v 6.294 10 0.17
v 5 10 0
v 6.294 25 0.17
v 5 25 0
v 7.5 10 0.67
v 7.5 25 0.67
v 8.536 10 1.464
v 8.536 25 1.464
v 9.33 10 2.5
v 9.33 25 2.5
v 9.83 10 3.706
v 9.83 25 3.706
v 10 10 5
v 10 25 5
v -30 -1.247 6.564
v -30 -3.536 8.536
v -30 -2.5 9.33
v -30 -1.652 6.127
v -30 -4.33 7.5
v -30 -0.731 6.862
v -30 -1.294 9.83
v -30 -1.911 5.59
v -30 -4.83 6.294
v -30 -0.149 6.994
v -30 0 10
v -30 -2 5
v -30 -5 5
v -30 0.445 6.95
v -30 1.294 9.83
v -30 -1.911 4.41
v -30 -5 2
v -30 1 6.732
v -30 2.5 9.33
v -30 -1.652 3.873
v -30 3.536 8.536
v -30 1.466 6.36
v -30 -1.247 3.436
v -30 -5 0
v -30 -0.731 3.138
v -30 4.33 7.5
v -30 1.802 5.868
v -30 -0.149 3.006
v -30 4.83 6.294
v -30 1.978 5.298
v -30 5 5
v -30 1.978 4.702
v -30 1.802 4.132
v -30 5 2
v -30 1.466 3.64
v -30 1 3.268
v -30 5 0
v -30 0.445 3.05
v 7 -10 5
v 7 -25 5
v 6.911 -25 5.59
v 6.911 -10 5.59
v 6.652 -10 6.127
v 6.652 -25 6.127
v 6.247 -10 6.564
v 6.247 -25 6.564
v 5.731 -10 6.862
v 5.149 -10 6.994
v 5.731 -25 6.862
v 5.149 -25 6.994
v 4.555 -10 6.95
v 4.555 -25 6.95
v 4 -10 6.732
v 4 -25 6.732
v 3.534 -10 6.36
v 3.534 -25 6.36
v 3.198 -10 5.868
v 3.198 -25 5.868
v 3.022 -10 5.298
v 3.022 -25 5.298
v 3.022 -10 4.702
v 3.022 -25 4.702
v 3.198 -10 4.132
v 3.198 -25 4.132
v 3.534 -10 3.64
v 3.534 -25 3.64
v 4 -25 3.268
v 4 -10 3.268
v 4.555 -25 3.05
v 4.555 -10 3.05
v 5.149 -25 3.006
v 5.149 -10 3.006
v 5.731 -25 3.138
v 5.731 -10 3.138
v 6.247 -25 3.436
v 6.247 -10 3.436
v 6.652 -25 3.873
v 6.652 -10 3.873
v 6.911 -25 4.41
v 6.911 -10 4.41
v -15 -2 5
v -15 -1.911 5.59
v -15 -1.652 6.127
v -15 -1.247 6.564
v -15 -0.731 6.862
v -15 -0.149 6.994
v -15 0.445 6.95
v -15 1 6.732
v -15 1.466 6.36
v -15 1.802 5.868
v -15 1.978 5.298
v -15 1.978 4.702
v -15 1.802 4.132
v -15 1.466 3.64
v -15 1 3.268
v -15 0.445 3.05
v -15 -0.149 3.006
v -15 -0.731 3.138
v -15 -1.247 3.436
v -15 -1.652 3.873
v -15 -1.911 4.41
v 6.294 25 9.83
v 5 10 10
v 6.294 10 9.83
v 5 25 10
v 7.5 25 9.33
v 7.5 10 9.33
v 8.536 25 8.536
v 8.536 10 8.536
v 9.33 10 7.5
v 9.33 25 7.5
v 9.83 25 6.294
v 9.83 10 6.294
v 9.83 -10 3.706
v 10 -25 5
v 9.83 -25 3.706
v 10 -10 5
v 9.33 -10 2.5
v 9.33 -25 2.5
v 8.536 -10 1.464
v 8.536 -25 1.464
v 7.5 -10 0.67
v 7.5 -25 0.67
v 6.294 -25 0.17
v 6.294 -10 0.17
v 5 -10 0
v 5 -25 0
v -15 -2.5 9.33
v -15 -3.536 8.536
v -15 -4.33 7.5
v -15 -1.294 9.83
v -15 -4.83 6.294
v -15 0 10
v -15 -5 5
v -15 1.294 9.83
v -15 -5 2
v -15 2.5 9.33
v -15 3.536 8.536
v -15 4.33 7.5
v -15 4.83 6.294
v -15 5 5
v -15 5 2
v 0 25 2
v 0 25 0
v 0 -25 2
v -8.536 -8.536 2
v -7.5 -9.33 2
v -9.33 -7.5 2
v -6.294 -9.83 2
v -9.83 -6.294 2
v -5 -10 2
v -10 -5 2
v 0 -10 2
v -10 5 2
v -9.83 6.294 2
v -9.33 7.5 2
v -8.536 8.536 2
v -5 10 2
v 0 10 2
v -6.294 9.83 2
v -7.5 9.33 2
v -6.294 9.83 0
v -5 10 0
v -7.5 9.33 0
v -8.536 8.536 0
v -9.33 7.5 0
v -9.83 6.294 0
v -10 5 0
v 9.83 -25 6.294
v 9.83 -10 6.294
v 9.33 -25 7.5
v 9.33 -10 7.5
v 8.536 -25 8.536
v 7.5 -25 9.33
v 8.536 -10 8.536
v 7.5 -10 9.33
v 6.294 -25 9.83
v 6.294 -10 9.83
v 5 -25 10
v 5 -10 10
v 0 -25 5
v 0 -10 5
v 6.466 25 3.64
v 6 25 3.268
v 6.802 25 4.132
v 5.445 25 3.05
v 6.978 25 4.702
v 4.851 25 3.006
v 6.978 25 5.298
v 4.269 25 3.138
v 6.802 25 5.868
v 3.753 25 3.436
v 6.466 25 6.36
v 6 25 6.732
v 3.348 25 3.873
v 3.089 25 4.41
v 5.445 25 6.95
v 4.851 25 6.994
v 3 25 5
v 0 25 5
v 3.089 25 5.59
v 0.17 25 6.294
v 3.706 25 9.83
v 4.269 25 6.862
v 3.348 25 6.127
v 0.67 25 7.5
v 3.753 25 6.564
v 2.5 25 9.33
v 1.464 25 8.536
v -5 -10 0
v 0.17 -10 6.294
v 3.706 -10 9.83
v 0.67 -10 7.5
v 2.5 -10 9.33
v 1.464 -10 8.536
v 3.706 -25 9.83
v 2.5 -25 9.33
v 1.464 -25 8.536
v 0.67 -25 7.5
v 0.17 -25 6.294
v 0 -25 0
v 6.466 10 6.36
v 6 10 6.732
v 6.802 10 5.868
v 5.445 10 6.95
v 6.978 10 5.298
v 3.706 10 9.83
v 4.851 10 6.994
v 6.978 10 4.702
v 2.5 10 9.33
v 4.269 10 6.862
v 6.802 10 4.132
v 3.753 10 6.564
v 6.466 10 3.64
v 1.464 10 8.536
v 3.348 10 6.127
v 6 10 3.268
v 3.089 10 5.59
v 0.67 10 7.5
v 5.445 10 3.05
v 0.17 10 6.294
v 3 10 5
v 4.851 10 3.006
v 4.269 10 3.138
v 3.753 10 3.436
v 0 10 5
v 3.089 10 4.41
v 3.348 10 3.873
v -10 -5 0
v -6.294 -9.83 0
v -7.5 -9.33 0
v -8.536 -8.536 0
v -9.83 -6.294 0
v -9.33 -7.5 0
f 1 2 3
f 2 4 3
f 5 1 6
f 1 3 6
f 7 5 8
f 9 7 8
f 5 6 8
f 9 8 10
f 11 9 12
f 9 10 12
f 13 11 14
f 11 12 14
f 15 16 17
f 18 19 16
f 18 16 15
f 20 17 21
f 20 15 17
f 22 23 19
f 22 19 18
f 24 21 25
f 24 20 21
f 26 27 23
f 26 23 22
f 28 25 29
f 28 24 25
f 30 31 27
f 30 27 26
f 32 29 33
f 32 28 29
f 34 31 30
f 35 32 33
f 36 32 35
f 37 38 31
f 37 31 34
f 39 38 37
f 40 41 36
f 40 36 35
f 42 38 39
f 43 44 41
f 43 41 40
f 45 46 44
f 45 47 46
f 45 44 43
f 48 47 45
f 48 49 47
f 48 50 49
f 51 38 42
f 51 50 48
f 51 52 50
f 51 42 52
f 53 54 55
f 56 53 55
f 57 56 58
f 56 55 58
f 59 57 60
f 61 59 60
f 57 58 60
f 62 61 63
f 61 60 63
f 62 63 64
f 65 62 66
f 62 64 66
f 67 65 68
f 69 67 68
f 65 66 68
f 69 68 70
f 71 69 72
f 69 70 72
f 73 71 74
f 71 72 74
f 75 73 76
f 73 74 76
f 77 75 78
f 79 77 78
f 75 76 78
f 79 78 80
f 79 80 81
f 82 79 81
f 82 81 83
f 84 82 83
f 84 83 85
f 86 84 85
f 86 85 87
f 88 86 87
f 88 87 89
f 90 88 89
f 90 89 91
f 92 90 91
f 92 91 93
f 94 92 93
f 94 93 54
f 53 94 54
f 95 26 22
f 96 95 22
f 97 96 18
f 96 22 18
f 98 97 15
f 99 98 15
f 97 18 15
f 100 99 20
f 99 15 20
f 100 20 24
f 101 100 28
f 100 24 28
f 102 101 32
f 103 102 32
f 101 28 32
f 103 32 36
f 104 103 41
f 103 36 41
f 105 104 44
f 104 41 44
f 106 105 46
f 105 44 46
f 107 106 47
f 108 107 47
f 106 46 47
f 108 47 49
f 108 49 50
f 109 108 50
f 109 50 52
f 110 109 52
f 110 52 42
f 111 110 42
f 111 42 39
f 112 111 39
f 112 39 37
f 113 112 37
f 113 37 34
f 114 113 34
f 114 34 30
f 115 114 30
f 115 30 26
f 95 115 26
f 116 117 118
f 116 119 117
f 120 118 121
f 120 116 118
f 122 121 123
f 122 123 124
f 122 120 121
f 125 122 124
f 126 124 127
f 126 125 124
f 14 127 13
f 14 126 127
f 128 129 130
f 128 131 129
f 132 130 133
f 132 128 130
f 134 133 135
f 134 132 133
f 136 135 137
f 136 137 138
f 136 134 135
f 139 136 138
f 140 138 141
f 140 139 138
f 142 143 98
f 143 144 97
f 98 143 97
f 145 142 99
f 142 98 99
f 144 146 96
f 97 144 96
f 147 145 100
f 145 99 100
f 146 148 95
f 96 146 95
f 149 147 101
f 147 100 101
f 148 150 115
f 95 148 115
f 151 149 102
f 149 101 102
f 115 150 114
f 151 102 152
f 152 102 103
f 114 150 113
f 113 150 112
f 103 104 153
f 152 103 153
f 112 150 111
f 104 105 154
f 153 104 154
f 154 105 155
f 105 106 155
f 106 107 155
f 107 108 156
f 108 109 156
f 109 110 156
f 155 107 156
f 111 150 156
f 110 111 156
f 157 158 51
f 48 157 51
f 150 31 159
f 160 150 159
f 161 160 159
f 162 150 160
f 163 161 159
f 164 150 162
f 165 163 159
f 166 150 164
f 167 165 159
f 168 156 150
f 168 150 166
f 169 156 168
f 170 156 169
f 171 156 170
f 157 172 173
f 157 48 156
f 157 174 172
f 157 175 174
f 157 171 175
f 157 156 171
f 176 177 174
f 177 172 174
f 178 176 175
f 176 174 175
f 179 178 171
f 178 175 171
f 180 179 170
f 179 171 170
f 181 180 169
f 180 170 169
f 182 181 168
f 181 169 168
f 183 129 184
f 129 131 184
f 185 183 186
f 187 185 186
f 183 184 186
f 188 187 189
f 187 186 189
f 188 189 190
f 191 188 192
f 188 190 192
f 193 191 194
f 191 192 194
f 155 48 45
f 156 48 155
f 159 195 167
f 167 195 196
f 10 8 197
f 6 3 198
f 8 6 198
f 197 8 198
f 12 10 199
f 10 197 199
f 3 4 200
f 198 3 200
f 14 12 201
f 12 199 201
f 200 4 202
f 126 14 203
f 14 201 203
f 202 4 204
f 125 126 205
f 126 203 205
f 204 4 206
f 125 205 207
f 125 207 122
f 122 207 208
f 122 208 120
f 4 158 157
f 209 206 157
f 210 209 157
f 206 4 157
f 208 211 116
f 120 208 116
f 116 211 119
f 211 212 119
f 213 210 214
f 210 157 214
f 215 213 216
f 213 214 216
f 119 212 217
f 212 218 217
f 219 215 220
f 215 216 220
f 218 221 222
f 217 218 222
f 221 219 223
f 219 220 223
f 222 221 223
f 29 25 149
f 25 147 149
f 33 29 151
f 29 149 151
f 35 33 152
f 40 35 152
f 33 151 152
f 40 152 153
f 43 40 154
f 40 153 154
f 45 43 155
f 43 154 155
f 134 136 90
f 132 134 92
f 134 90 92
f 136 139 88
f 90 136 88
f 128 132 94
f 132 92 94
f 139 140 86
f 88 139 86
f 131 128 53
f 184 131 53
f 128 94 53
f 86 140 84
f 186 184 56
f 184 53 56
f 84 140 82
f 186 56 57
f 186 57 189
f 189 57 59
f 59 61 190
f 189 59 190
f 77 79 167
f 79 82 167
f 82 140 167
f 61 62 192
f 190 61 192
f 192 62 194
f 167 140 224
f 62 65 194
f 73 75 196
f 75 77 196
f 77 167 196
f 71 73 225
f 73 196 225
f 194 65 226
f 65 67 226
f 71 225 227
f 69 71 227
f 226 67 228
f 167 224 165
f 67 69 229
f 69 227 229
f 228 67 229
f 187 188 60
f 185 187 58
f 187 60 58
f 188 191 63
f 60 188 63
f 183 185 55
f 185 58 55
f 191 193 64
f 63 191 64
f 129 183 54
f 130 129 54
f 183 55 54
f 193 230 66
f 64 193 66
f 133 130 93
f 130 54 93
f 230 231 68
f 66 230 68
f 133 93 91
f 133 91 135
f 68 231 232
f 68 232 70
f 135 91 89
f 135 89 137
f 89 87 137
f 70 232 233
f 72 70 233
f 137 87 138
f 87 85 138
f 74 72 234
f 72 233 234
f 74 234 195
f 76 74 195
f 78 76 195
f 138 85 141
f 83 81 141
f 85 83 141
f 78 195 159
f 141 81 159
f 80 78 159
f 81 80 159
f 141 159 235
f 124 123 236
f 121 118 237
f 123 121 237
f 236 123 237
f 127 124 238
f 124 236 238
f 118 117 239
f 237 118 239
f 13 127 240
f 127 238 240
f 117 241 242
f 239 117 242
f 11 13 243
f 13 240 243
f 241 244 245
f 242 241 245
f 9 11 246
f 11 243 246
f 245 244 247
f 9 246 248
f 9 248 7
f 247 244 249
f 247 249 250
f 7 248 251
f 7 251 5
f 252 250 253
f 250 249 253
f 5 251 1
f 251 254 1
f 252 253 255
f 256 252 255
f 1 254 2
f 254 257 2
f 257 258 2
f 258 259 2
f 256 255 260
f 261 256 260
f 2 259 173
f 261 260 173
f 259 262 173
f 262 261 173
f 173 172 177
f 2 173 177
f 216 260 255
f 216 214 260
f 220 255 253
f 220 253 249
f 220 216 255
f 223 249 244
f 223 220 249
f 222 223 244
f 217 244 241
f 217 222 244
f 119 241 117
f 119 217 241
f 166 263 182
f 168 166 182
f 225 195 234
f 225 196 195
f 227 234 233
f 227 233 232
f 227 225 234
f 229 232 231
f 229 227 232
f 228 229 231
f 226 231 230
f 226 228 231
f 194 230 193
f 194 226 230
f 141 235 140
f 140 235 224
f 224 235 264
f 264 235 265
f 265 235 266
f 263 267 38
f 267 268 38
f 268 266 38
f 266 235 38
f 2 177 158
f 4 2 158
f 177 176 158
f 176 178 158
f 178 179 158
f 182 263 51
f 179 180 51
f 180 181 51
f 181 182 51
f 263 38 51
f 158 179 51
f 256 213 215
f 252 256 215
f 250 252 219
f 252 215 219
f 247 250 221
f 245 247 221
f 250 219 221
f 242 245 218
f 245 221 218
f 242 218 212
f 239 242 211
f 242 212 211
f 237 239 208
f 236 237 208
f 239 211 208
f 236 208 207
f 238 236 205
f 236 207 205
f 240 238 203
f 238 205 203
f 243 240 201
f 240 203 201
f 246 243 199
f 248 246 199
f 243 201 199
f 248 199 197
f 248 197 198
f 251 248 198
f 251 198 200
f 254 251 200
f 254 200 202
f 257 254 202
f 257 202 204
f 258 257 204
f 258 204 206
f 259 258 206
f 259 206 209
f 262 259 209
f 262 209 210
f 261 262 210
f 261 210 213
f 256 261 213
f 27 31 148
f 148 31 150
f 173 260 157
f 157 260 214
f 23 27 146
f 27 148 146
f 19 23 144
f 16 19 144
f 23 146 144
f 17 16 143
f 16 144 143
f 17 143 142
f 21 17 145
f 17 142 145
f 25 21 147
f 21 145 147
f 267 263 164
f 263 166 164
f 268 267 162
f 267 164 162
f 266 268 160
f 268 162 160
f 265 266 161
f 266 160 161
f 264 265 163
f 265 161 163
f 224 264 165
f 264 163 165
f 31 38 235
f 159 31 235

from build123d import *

# Parameters (mm, degrees)
F0_W      = 15
F0_H      = 3
F1_DEPTH  = 2
F2_W      = 15
F2_H      = 10
F3_DEPTH  = 8
F4_R      = 2
F5_DEPTH  = 25
F6_R      = 4.99999
F7_W      = 15
F7_H      = 8
F7_H_2    = 2
F8_DEPTH  = 10
F9_R      = 4.99999
F10_R     = 2
F11_DEPTH = 25
F12_W     = 15
F12_H     = 2
F12_H_2   = 8
F13_DEPTH = 10
F14_R     = 4.99999
F15_R     = 2
F16_DEPTH = 25
F17_R     = 5


# Not quite as in the source:
# - a fillet or chamfer is up to 0.001 mm smaller than in the source, because OpenCascade refuses the exact size


with BuildPart() as f1:
    # F0 (on Top) → F1 (new body)
    with BuildSketch(Plane.XY):
        Polygon((0, 25), (-30, 5), (-15, 5), (-15, 2), (-15, -2), (-15, -5), (-30, -5), (0, -25), (0, -10), (-10, -10), (-10, 10), (0, 10), align=None)
        with Locations((-22.5, 3.5)):
            Rectangle(F0_W, F0_H)
        Polygon((-30, 2), (-30, 0), (-30, -2), (-15, -2), (-15, 2), align=None)
        with Locations((-22.5, -3.5)):
            Rectangle(F0_W, F0_H)
    extrude(amount=F1_DEPTH)

    # F2 (on face) → F3 (join)
    with BuildSketch(Plane.XY.offset(2)):
        with Locations((-22.5, 0)):
            Rectangle(F2_W, F2_H)
    extrude(amount=F3_DEPTH)

    # F4 (on face) → F5 (cut)
    with BuildSketch(Plane(origin=(-30, 0, 0), x_dir=(0, -1, 0), z_dir=(-1, 0, 0))):
        with Locations((0, 5)):
            Circle(F4_R)
    extrude(amount=-F5_DEPTH, mode=Mode.SUBTRACT)

    # F6 (radius 5 in the source; OpenCascade refuses exactly that, so slightly less here)
    f6_edges = [f1.edges().sort_by_distance(p)[0] for p in [
        (-22.5, -5, 10),
        (-22.5, 5, 10),
    ]]
    fillet(f6_edges, radius=F6_R)

    # F7 (on face) → F8 (join)
    with BuildSketch(Plane.YZ):
        with Locations((-17.5, 6)):
            Rectangle(F7_W, F7_H)
        with Locations((-17.5, 1)):
            Rectangle(F7_W, F7_H_2)
    extrude(amount=F8_DEPTH)

    # F9 (radius 5 in the source; OpenCascade refuses exactly that, so slightly less here)
    f9_edges = [f1.edges().sort_by_distance(p)[0] for p in [
        (0, -17.5, 10),
        (10, -17.5, 10),
        (10, -17.5, 0),
    ]]
    fillet(f9_edges, radius=F9_R)

    # F10 (on face) → F11 (cut)
    with BuildSketch(Plane.XZ.offset(25)):
        with Locations((5, 5)):
            Circle(F10_R)
    extrude(amount=-F11_DEPTH, mode=Mode.SUBTRACT)

    # F12 (on face) → F13 (join)
    with BuildSketch(Plane.YZ):
        with Locations((17.5, 1)):
            Rectangle(F12_W, F12_H)
        with Locations((17.5, 6)):
            Rectangle(F12_W, F12_H_2)
    extrude(amount=F13_DEPTH)

    # F14 (radius 5 in the source; OpenCascade refuses exactly that, so slightly less here)
    f14_edges = [f1.edges().sort_by_distance(p)[0] for p in [
        (0, 17.5, 10),
        (10, 17.5, 10),
        (10, 17.5, 0),
    ]]
    fillet(f14_edges, radius=F14_R)

    # F15 (on face) → F16 (cut)
    with BuildSketch(Plane(origin=(0, 25, 0), x_dir=(-1, 0, 0), z_dir=(0, 1, 0))):
        with Locations((-5, 5)):
            Circle(F15_R)
    extrude(amount=-F16_DEPTH, mode=Mode.SUBTRACT)

    # F17
    f17_edges = [f1.edges().sort_by_distance(p)[0] for p in [
        (-10, 10, 1),
        (-10, -10, 1),
    ]]
    fillet(f17_edges, radius=F17_R)


solid = f1.part
